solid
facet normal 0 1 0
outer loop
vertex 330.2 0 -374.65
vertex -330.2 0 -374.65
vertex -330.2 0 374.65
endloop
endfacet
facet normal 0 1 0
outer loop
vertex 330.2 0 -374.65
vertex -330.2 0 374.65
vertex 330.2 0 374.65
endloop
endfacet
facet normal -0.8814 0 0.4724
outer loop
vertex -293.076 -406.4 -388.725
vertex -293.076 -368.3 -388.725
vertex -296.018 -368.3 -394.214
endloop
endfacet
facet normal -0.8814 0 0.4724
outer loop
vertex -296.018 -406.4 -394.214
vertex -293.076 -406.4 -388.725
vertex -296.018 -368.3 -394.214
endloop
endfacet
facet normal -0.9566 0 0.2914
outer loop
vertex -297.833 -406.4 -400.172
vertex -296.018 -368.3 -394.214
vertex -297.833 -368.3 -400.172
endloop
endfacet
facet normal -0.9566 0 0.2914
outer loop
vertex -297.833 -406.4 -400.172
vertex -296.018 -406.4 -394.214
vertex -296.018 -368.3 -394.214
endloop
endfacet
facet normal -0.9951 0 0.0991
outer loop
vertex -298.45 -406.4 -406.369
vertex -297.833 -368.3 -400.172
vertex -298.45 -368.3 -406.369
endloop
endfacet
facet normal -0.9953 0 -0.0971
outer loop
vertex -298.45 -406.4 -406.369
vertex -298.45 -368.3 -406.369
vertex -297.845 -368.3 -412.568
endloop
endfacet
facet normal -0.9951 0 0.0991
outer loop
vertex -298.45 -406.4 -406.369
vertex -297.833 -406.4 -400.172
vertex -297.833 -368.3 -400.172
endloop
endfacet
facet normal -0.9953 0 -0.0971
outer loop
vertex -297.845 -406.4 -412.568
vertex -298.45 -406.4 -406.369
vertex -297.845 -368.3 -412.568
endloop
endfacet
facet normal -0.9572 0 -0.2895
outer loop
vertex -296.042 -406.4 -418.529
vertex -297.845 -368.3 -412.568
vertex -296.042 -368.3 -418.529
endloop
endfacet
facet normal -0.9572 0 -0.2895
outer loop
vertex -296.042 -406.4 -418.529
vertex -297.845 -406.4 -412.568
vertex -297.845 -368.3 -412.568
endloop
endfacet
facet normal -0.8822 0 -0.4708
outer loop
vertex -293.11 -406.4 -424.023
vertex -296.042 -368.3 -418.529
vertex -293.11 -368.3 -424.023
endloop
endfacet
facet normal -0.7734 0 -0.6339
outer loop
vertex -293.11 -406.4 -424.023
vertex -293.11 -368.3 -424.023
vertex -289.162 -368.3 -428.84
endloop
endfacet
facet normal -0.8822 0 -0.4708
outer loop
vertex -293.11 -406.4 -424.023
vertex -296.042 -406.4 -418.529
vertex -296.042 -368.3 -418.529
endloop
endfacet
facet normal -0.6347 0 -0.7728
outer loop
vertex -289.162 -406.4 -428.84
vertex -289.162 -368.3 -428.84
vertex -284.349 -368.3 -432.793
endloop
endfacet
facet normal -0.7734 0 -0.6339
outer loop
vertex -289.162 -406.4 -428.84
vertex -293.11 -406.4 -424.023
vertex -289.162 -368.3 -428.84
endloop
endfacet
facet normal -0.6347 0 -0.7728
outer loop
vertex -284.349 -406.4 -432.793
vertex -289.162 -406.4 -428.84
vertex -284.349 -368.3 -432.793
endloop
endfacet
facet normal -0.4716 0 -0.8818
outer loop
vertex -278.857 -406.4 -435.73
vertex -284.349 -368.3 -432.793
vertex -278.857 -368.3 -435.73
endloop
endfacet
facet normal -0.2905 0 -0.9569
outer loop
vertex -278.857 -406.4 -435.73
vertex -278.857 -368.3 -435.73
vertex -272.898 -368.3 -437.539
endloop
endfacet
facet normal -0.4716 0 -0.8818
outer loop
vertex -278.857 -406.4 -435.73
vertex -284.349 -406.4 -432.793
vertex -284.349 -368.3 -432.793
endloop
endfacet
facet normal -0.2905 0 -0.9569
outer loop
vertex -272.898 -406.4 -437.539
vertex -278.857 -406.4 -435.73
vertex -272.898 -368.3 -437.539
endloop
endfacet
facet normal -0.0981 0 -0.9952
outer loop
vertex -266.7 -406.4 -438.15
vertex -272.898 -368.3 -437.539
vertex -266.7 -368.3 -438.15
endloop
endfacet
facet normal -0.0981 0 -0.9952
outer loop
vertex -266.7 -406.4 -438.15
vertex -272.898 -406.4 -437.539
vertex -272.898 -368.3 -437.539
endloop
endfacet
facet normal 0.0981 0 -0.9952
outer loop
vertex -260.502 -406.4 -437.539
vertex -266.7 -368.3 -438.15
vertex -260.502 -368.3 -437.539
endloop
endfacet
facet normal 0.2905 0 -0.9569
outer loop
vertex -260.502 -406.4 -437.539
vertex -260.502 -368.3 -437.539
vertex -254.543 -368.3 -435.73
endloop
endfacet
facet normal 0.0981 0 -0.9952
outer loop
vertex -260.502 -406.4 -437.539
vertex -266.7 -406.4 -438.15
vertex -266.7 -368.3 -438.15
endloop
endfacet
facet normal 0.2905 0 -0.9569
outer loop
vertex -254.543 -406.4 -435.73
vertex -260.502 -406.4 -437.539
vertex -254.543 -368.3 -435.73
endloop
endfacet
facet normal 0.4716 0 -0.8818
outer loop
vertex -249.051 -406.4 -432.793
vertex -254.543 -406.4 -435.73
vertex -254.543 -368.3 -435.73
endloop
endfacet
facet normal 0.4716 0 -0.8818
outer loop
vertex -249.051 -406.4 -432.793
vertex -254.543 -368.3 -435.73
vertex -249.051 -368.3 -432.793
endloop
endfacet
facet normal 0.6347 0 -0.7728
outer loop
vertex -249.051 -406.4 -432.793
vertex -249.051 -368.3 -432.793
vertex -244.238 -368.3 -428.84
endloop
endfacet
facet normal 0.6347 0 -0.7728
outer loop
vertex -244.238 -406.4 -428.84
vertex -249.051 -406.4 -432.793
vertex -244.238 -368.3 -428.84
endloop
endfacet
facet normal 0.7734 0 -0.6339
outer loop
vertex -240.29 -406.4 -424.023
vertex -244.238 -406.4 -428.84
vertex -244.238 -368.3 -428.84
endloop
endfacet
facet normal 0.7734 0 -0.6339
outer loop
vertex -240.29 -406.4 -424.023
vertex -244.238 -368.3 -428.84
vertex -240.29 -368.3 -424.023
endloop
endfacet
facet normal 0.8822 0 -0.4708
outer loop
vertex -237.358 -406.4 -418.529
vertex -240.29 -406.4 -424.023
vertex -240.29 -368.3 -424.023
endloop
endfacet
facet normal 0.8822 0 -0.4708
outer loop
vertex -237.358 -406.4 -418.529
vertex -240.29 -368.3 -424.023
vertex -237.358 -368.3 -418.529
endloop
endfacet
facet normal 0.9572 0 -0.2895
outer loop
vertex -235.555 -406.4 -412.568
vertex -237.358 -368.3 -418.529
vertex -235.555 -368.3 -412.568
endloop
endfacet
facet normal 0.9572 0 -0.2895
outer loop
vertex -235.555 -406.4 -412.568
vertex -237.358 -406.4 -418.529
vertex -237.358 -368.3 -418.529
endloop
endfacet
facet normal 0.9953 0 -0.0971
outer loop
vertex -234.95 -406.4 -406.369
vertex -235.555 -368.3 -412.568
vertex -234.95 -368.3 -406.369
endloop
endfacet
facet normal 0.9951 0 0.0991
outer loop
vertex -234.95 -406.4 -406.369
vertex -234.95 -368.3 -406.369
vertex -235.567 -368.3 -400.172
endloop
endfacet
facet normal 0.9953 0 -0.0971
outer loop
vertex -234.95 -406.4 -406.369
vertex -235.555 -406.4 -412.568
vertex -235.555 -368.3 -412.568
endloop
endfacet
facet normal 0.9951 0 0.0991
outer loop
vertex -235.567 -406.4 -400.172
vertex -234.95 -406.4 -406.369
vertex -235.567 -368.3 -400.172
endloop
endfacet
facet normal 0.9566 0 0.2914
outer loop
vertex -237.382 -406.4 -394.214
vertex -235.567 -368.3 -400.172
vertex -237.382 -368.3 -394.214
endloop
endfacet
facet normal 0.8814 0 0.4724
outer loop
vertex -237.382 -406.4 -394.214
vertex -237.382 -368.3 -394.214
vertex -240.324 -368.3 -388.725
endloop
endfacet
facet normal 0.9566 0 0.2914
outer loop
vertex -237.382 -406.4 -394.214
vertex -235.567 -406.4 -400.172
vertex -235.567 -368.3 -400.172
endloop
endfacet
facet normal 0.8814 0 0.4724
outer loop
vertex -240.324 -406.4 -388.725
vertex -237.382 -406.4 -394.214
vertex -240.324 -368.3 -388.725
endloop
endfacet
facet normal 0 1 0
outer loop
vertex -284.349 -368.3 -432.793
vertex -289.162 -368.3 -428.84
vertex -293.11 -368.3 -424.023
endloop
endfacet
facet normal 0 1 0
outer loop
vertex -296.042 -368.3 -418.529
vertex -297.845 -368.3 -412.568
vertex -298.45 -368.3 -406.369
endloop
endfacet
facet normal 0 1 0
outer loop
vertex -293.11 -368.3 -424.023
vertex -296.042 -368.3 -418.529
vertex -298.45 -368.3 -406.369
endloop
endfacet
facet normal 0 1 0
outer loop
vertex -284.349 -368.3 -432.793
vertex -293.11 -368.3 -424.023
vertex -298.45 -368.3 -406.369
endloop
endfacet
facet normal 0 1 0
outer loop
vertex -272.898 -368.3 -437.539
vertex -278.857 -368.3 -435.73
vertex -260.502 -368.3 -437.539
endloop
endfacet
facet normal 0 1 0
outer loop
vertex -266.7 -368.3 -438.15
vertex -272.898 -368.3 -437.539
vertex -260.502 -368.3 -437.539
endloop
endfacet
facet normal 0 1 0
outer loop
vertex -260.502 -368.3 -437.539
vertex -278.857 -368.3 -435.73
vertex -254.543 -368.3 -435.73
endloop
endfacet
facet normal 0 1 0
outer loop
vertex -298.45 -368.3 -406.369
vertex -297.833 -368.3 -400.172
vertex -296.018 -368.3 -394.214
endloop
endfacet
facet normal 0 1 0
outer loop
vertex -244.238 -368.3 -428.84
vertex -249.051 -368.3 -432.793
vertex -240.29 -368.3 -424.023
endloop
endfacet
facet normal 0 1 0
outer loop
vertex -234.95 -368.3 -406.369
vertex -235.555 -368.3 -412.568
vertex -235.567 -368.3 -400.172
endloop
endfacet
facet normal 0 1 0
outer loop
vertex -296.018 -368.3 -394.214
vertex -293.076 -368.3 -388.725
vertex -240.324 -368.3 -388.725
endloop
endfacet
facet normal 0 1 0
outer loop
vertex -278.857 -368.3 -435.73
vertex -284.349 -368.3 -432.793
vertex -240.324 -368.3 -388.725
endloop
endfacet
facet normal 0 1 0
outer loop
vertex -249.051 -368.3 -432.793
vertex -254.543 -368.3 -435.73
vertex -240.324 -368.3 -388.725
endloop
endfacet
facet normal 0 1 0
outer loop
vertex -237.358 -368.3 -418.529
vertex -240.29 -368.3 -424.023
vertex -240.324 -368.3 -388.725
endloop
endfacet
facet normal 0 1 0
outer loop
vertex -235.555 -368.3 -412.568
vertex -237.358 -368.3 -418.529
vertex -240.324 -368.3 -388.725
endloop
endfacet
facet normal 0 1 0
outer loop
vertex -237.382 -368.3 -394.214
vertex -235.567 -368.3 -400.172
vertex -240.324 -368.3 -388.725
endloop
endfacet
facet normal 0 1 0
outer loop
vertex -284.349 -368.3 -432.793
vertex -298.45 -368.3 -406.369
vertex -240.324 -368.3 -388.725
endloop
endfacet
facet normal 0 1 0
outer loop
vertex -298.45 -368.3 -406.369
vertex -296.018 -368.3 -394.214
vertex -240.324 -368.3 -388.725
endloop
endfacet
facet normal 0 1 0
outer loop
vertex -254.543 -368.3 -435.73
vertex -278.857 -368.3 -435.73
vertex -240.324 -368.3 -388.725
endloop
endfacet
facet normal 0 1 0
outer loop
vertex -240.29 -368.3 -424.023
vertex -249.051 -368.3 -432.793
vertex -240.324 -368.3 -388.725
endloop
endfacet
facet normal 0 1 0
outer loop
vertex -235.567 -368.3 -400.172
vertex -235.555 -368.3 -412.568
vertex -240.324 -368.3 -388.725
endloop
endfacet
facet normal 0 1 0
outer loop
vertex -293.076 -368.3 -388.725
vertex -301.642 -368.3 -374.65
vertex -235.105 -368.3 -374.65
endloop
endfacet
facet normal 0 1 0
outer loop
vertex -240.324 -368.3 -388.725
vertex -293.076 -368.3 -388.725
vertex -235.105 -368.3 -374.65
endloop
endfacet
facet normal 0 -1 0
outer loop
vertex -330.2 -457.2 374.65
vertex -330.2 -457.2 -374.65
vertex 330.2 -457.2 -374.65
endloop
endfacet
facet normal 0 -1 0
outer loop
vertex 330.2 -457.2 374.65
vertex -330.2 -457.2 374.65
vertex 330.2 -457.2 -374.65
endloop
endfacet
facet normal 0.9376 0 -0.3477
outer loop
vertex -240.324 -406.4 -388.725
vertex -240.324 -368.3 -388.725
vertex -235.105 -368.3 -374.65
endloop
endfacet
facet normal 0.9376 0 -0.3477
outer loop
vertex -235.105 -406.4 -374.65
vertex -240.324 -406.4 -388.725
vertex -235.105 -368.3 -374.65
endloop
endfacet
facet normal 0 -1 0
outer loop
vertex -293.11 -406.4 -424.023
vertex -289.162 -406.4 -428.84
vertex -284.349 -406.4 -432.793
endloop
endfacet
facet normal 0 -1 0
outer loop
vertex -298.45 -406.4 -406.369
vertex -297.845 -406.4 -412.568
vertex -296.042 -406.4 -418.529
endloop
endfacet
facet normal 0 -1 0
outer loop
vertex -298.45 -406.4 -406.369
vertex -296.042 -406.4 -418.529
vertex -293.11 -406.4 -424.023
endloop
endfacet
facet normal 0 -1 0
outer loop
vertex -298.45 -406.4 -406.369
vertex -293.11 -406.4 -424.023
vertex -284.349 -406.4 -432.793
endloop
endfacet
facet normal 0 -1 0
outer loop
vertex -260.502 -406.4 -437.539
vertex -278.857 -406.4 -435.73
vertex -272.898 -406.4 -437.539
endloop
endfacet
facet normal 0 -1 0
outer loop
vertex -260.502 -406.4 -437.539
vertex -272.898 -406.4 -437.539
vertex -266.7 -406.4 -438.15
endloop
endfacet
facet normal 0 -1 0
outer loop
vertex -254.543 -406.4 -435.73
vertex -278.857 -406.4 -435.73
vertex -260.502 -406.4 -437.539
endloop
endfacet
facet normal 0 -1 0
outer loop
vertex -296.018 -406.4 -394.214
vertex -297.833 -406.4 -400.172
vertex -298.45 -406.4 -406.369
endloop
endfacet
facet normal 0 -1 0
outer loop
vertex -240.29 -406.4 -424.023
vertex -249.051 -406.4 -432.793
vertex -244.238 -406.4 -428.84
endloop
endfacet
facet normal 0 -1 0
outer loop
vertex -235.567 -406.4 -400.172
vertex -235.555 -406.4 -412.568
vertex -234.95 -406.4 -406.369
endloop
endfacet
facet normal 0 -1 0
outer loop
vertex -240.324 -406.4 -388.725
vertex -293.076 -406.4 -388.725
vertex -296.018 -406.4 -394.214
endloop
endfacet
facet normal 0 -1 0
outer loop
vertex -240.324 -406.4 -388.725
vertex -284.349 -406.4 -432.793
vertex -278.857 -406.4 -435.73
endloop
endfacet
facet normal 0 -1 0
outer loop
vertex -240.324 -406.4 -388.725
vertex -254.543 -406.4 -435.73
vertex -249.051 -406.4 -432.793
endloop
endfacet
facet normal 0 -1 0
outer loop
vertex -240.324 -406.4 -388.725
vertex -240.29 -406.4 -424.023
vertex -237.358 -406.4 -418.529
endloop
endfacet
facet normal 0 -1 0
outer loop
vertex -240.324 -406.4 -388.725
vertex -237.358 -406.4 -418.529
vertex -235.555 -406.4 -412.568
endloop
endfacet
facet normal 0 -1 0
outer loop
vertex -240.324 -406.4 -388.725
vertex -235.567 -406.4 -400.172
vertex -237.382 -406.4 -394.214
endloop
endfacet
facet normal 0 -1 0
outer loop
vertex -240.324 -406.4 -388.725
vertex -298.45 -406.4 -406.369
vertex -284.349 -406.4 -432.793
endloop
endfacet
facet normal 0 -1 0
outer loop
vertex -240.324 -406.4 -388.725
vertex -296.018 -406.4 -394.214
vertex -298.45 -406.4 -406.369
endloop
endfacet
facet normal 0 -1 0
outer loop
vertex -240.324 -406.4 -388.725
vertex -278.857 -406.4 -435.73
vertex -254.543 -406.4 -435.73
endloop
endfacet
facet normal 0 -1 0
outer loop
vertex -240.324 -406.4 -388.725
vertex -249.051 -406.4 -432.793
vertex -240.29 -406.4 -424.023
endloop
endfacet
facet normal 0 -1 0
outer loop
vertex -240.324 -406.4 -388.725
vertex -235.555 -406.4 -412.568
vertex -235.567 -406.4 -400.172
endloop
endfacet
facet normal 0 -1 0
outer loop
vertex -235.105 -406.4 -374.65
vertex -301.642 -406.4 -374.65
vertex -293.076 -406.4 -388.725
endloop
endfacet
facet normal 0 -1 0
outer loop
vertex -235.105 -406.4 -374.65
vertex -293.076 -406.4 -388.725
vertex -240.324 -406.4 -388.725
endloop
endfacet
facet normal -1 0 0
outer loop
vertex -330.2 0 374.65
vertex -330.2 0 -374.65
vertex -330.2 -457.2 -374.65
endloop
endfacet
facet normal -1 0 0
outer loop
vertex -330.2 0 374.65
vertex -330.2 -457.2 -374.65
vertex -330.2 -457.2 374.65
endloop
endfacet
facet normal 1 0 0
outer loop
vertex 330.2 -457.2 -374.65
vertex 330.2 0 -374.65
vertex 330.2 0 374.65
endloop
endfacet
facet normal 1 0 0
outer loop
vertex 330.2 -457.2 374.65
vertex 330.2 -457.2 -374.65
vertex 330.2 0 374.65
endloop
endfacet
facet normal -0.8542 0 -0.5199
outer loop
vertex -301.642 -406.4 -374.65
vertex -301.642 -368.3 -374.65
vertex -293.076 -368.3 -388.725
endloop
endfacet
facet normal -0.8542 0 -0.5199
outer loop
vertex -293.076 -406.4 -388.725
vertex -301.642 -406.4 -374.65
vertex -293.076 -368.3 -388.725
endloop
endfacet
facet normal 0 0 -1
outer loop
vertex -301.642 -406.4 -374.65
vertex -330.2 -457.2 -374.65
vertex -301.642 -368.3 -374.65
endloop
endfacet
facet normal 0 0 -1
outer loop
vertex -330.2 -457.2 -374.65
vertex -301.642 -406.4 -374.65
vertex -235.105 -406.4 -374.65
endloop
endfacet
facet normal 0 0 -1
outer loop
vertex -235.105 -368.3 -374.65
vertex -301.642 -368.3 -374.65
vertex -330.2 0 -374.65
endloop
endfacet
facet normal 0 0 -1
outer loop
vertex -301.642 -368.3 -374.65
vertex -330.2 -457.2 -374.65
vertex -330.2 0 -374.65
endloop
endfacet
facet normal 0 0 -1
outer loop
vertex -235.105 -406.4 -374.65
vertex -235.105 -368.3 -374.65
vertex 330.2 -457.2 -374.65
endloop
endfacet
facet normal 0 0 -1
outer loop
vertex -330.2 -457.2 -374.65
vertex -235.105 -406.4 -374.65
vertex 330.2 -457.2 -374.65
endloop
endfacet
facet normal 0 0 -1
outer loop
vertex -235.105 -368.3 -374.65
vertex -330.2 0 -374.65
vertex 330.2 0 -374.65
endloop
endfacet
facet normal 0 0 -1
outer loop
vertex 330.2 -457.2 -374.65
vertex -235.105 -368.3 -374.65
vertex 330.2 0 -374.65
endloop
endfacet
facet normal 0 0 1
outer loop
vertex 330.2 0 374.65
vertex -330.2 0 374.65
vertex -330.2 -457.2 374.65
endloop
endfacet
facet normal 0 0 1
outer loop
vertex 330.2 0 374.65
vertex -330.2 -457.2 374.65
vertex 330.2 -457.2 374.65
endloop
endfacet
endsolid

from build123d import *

# Parameters (mm, degrees)
F0_W     = 660.4
F0_H     = 749.3
F1_DEPTH = 457.2
F4_DEPTH = 38.1


with BuildPart() as f1:
    # F0 (on Front) → F1 (new body)
    with BuildSketch(Plane.XZ):
        Rectangle(F0_W, F0_H)
    extrude(amount=F1_DEPTH)

    # F3 (on offset) → F4 (join)
    with BuildSketch(Plane.XZ.offset(406.4)):
        with BuildLine():
            Line((-301.641643, -374.65), (-293.075598, -388.725433))
            ThreePointArc((-293.075598, -388.725433), (-266.7, -438.15), (-240.324402, -388.725433))
            Line((-240.324402, -388.725433), (-235.105276, -374.65))
            Line((-235.105276, -374.65), (-301.641643, -374.65))
        make_face()
    extrude(amount=-F4_DEPTH)


solid = f1.part
